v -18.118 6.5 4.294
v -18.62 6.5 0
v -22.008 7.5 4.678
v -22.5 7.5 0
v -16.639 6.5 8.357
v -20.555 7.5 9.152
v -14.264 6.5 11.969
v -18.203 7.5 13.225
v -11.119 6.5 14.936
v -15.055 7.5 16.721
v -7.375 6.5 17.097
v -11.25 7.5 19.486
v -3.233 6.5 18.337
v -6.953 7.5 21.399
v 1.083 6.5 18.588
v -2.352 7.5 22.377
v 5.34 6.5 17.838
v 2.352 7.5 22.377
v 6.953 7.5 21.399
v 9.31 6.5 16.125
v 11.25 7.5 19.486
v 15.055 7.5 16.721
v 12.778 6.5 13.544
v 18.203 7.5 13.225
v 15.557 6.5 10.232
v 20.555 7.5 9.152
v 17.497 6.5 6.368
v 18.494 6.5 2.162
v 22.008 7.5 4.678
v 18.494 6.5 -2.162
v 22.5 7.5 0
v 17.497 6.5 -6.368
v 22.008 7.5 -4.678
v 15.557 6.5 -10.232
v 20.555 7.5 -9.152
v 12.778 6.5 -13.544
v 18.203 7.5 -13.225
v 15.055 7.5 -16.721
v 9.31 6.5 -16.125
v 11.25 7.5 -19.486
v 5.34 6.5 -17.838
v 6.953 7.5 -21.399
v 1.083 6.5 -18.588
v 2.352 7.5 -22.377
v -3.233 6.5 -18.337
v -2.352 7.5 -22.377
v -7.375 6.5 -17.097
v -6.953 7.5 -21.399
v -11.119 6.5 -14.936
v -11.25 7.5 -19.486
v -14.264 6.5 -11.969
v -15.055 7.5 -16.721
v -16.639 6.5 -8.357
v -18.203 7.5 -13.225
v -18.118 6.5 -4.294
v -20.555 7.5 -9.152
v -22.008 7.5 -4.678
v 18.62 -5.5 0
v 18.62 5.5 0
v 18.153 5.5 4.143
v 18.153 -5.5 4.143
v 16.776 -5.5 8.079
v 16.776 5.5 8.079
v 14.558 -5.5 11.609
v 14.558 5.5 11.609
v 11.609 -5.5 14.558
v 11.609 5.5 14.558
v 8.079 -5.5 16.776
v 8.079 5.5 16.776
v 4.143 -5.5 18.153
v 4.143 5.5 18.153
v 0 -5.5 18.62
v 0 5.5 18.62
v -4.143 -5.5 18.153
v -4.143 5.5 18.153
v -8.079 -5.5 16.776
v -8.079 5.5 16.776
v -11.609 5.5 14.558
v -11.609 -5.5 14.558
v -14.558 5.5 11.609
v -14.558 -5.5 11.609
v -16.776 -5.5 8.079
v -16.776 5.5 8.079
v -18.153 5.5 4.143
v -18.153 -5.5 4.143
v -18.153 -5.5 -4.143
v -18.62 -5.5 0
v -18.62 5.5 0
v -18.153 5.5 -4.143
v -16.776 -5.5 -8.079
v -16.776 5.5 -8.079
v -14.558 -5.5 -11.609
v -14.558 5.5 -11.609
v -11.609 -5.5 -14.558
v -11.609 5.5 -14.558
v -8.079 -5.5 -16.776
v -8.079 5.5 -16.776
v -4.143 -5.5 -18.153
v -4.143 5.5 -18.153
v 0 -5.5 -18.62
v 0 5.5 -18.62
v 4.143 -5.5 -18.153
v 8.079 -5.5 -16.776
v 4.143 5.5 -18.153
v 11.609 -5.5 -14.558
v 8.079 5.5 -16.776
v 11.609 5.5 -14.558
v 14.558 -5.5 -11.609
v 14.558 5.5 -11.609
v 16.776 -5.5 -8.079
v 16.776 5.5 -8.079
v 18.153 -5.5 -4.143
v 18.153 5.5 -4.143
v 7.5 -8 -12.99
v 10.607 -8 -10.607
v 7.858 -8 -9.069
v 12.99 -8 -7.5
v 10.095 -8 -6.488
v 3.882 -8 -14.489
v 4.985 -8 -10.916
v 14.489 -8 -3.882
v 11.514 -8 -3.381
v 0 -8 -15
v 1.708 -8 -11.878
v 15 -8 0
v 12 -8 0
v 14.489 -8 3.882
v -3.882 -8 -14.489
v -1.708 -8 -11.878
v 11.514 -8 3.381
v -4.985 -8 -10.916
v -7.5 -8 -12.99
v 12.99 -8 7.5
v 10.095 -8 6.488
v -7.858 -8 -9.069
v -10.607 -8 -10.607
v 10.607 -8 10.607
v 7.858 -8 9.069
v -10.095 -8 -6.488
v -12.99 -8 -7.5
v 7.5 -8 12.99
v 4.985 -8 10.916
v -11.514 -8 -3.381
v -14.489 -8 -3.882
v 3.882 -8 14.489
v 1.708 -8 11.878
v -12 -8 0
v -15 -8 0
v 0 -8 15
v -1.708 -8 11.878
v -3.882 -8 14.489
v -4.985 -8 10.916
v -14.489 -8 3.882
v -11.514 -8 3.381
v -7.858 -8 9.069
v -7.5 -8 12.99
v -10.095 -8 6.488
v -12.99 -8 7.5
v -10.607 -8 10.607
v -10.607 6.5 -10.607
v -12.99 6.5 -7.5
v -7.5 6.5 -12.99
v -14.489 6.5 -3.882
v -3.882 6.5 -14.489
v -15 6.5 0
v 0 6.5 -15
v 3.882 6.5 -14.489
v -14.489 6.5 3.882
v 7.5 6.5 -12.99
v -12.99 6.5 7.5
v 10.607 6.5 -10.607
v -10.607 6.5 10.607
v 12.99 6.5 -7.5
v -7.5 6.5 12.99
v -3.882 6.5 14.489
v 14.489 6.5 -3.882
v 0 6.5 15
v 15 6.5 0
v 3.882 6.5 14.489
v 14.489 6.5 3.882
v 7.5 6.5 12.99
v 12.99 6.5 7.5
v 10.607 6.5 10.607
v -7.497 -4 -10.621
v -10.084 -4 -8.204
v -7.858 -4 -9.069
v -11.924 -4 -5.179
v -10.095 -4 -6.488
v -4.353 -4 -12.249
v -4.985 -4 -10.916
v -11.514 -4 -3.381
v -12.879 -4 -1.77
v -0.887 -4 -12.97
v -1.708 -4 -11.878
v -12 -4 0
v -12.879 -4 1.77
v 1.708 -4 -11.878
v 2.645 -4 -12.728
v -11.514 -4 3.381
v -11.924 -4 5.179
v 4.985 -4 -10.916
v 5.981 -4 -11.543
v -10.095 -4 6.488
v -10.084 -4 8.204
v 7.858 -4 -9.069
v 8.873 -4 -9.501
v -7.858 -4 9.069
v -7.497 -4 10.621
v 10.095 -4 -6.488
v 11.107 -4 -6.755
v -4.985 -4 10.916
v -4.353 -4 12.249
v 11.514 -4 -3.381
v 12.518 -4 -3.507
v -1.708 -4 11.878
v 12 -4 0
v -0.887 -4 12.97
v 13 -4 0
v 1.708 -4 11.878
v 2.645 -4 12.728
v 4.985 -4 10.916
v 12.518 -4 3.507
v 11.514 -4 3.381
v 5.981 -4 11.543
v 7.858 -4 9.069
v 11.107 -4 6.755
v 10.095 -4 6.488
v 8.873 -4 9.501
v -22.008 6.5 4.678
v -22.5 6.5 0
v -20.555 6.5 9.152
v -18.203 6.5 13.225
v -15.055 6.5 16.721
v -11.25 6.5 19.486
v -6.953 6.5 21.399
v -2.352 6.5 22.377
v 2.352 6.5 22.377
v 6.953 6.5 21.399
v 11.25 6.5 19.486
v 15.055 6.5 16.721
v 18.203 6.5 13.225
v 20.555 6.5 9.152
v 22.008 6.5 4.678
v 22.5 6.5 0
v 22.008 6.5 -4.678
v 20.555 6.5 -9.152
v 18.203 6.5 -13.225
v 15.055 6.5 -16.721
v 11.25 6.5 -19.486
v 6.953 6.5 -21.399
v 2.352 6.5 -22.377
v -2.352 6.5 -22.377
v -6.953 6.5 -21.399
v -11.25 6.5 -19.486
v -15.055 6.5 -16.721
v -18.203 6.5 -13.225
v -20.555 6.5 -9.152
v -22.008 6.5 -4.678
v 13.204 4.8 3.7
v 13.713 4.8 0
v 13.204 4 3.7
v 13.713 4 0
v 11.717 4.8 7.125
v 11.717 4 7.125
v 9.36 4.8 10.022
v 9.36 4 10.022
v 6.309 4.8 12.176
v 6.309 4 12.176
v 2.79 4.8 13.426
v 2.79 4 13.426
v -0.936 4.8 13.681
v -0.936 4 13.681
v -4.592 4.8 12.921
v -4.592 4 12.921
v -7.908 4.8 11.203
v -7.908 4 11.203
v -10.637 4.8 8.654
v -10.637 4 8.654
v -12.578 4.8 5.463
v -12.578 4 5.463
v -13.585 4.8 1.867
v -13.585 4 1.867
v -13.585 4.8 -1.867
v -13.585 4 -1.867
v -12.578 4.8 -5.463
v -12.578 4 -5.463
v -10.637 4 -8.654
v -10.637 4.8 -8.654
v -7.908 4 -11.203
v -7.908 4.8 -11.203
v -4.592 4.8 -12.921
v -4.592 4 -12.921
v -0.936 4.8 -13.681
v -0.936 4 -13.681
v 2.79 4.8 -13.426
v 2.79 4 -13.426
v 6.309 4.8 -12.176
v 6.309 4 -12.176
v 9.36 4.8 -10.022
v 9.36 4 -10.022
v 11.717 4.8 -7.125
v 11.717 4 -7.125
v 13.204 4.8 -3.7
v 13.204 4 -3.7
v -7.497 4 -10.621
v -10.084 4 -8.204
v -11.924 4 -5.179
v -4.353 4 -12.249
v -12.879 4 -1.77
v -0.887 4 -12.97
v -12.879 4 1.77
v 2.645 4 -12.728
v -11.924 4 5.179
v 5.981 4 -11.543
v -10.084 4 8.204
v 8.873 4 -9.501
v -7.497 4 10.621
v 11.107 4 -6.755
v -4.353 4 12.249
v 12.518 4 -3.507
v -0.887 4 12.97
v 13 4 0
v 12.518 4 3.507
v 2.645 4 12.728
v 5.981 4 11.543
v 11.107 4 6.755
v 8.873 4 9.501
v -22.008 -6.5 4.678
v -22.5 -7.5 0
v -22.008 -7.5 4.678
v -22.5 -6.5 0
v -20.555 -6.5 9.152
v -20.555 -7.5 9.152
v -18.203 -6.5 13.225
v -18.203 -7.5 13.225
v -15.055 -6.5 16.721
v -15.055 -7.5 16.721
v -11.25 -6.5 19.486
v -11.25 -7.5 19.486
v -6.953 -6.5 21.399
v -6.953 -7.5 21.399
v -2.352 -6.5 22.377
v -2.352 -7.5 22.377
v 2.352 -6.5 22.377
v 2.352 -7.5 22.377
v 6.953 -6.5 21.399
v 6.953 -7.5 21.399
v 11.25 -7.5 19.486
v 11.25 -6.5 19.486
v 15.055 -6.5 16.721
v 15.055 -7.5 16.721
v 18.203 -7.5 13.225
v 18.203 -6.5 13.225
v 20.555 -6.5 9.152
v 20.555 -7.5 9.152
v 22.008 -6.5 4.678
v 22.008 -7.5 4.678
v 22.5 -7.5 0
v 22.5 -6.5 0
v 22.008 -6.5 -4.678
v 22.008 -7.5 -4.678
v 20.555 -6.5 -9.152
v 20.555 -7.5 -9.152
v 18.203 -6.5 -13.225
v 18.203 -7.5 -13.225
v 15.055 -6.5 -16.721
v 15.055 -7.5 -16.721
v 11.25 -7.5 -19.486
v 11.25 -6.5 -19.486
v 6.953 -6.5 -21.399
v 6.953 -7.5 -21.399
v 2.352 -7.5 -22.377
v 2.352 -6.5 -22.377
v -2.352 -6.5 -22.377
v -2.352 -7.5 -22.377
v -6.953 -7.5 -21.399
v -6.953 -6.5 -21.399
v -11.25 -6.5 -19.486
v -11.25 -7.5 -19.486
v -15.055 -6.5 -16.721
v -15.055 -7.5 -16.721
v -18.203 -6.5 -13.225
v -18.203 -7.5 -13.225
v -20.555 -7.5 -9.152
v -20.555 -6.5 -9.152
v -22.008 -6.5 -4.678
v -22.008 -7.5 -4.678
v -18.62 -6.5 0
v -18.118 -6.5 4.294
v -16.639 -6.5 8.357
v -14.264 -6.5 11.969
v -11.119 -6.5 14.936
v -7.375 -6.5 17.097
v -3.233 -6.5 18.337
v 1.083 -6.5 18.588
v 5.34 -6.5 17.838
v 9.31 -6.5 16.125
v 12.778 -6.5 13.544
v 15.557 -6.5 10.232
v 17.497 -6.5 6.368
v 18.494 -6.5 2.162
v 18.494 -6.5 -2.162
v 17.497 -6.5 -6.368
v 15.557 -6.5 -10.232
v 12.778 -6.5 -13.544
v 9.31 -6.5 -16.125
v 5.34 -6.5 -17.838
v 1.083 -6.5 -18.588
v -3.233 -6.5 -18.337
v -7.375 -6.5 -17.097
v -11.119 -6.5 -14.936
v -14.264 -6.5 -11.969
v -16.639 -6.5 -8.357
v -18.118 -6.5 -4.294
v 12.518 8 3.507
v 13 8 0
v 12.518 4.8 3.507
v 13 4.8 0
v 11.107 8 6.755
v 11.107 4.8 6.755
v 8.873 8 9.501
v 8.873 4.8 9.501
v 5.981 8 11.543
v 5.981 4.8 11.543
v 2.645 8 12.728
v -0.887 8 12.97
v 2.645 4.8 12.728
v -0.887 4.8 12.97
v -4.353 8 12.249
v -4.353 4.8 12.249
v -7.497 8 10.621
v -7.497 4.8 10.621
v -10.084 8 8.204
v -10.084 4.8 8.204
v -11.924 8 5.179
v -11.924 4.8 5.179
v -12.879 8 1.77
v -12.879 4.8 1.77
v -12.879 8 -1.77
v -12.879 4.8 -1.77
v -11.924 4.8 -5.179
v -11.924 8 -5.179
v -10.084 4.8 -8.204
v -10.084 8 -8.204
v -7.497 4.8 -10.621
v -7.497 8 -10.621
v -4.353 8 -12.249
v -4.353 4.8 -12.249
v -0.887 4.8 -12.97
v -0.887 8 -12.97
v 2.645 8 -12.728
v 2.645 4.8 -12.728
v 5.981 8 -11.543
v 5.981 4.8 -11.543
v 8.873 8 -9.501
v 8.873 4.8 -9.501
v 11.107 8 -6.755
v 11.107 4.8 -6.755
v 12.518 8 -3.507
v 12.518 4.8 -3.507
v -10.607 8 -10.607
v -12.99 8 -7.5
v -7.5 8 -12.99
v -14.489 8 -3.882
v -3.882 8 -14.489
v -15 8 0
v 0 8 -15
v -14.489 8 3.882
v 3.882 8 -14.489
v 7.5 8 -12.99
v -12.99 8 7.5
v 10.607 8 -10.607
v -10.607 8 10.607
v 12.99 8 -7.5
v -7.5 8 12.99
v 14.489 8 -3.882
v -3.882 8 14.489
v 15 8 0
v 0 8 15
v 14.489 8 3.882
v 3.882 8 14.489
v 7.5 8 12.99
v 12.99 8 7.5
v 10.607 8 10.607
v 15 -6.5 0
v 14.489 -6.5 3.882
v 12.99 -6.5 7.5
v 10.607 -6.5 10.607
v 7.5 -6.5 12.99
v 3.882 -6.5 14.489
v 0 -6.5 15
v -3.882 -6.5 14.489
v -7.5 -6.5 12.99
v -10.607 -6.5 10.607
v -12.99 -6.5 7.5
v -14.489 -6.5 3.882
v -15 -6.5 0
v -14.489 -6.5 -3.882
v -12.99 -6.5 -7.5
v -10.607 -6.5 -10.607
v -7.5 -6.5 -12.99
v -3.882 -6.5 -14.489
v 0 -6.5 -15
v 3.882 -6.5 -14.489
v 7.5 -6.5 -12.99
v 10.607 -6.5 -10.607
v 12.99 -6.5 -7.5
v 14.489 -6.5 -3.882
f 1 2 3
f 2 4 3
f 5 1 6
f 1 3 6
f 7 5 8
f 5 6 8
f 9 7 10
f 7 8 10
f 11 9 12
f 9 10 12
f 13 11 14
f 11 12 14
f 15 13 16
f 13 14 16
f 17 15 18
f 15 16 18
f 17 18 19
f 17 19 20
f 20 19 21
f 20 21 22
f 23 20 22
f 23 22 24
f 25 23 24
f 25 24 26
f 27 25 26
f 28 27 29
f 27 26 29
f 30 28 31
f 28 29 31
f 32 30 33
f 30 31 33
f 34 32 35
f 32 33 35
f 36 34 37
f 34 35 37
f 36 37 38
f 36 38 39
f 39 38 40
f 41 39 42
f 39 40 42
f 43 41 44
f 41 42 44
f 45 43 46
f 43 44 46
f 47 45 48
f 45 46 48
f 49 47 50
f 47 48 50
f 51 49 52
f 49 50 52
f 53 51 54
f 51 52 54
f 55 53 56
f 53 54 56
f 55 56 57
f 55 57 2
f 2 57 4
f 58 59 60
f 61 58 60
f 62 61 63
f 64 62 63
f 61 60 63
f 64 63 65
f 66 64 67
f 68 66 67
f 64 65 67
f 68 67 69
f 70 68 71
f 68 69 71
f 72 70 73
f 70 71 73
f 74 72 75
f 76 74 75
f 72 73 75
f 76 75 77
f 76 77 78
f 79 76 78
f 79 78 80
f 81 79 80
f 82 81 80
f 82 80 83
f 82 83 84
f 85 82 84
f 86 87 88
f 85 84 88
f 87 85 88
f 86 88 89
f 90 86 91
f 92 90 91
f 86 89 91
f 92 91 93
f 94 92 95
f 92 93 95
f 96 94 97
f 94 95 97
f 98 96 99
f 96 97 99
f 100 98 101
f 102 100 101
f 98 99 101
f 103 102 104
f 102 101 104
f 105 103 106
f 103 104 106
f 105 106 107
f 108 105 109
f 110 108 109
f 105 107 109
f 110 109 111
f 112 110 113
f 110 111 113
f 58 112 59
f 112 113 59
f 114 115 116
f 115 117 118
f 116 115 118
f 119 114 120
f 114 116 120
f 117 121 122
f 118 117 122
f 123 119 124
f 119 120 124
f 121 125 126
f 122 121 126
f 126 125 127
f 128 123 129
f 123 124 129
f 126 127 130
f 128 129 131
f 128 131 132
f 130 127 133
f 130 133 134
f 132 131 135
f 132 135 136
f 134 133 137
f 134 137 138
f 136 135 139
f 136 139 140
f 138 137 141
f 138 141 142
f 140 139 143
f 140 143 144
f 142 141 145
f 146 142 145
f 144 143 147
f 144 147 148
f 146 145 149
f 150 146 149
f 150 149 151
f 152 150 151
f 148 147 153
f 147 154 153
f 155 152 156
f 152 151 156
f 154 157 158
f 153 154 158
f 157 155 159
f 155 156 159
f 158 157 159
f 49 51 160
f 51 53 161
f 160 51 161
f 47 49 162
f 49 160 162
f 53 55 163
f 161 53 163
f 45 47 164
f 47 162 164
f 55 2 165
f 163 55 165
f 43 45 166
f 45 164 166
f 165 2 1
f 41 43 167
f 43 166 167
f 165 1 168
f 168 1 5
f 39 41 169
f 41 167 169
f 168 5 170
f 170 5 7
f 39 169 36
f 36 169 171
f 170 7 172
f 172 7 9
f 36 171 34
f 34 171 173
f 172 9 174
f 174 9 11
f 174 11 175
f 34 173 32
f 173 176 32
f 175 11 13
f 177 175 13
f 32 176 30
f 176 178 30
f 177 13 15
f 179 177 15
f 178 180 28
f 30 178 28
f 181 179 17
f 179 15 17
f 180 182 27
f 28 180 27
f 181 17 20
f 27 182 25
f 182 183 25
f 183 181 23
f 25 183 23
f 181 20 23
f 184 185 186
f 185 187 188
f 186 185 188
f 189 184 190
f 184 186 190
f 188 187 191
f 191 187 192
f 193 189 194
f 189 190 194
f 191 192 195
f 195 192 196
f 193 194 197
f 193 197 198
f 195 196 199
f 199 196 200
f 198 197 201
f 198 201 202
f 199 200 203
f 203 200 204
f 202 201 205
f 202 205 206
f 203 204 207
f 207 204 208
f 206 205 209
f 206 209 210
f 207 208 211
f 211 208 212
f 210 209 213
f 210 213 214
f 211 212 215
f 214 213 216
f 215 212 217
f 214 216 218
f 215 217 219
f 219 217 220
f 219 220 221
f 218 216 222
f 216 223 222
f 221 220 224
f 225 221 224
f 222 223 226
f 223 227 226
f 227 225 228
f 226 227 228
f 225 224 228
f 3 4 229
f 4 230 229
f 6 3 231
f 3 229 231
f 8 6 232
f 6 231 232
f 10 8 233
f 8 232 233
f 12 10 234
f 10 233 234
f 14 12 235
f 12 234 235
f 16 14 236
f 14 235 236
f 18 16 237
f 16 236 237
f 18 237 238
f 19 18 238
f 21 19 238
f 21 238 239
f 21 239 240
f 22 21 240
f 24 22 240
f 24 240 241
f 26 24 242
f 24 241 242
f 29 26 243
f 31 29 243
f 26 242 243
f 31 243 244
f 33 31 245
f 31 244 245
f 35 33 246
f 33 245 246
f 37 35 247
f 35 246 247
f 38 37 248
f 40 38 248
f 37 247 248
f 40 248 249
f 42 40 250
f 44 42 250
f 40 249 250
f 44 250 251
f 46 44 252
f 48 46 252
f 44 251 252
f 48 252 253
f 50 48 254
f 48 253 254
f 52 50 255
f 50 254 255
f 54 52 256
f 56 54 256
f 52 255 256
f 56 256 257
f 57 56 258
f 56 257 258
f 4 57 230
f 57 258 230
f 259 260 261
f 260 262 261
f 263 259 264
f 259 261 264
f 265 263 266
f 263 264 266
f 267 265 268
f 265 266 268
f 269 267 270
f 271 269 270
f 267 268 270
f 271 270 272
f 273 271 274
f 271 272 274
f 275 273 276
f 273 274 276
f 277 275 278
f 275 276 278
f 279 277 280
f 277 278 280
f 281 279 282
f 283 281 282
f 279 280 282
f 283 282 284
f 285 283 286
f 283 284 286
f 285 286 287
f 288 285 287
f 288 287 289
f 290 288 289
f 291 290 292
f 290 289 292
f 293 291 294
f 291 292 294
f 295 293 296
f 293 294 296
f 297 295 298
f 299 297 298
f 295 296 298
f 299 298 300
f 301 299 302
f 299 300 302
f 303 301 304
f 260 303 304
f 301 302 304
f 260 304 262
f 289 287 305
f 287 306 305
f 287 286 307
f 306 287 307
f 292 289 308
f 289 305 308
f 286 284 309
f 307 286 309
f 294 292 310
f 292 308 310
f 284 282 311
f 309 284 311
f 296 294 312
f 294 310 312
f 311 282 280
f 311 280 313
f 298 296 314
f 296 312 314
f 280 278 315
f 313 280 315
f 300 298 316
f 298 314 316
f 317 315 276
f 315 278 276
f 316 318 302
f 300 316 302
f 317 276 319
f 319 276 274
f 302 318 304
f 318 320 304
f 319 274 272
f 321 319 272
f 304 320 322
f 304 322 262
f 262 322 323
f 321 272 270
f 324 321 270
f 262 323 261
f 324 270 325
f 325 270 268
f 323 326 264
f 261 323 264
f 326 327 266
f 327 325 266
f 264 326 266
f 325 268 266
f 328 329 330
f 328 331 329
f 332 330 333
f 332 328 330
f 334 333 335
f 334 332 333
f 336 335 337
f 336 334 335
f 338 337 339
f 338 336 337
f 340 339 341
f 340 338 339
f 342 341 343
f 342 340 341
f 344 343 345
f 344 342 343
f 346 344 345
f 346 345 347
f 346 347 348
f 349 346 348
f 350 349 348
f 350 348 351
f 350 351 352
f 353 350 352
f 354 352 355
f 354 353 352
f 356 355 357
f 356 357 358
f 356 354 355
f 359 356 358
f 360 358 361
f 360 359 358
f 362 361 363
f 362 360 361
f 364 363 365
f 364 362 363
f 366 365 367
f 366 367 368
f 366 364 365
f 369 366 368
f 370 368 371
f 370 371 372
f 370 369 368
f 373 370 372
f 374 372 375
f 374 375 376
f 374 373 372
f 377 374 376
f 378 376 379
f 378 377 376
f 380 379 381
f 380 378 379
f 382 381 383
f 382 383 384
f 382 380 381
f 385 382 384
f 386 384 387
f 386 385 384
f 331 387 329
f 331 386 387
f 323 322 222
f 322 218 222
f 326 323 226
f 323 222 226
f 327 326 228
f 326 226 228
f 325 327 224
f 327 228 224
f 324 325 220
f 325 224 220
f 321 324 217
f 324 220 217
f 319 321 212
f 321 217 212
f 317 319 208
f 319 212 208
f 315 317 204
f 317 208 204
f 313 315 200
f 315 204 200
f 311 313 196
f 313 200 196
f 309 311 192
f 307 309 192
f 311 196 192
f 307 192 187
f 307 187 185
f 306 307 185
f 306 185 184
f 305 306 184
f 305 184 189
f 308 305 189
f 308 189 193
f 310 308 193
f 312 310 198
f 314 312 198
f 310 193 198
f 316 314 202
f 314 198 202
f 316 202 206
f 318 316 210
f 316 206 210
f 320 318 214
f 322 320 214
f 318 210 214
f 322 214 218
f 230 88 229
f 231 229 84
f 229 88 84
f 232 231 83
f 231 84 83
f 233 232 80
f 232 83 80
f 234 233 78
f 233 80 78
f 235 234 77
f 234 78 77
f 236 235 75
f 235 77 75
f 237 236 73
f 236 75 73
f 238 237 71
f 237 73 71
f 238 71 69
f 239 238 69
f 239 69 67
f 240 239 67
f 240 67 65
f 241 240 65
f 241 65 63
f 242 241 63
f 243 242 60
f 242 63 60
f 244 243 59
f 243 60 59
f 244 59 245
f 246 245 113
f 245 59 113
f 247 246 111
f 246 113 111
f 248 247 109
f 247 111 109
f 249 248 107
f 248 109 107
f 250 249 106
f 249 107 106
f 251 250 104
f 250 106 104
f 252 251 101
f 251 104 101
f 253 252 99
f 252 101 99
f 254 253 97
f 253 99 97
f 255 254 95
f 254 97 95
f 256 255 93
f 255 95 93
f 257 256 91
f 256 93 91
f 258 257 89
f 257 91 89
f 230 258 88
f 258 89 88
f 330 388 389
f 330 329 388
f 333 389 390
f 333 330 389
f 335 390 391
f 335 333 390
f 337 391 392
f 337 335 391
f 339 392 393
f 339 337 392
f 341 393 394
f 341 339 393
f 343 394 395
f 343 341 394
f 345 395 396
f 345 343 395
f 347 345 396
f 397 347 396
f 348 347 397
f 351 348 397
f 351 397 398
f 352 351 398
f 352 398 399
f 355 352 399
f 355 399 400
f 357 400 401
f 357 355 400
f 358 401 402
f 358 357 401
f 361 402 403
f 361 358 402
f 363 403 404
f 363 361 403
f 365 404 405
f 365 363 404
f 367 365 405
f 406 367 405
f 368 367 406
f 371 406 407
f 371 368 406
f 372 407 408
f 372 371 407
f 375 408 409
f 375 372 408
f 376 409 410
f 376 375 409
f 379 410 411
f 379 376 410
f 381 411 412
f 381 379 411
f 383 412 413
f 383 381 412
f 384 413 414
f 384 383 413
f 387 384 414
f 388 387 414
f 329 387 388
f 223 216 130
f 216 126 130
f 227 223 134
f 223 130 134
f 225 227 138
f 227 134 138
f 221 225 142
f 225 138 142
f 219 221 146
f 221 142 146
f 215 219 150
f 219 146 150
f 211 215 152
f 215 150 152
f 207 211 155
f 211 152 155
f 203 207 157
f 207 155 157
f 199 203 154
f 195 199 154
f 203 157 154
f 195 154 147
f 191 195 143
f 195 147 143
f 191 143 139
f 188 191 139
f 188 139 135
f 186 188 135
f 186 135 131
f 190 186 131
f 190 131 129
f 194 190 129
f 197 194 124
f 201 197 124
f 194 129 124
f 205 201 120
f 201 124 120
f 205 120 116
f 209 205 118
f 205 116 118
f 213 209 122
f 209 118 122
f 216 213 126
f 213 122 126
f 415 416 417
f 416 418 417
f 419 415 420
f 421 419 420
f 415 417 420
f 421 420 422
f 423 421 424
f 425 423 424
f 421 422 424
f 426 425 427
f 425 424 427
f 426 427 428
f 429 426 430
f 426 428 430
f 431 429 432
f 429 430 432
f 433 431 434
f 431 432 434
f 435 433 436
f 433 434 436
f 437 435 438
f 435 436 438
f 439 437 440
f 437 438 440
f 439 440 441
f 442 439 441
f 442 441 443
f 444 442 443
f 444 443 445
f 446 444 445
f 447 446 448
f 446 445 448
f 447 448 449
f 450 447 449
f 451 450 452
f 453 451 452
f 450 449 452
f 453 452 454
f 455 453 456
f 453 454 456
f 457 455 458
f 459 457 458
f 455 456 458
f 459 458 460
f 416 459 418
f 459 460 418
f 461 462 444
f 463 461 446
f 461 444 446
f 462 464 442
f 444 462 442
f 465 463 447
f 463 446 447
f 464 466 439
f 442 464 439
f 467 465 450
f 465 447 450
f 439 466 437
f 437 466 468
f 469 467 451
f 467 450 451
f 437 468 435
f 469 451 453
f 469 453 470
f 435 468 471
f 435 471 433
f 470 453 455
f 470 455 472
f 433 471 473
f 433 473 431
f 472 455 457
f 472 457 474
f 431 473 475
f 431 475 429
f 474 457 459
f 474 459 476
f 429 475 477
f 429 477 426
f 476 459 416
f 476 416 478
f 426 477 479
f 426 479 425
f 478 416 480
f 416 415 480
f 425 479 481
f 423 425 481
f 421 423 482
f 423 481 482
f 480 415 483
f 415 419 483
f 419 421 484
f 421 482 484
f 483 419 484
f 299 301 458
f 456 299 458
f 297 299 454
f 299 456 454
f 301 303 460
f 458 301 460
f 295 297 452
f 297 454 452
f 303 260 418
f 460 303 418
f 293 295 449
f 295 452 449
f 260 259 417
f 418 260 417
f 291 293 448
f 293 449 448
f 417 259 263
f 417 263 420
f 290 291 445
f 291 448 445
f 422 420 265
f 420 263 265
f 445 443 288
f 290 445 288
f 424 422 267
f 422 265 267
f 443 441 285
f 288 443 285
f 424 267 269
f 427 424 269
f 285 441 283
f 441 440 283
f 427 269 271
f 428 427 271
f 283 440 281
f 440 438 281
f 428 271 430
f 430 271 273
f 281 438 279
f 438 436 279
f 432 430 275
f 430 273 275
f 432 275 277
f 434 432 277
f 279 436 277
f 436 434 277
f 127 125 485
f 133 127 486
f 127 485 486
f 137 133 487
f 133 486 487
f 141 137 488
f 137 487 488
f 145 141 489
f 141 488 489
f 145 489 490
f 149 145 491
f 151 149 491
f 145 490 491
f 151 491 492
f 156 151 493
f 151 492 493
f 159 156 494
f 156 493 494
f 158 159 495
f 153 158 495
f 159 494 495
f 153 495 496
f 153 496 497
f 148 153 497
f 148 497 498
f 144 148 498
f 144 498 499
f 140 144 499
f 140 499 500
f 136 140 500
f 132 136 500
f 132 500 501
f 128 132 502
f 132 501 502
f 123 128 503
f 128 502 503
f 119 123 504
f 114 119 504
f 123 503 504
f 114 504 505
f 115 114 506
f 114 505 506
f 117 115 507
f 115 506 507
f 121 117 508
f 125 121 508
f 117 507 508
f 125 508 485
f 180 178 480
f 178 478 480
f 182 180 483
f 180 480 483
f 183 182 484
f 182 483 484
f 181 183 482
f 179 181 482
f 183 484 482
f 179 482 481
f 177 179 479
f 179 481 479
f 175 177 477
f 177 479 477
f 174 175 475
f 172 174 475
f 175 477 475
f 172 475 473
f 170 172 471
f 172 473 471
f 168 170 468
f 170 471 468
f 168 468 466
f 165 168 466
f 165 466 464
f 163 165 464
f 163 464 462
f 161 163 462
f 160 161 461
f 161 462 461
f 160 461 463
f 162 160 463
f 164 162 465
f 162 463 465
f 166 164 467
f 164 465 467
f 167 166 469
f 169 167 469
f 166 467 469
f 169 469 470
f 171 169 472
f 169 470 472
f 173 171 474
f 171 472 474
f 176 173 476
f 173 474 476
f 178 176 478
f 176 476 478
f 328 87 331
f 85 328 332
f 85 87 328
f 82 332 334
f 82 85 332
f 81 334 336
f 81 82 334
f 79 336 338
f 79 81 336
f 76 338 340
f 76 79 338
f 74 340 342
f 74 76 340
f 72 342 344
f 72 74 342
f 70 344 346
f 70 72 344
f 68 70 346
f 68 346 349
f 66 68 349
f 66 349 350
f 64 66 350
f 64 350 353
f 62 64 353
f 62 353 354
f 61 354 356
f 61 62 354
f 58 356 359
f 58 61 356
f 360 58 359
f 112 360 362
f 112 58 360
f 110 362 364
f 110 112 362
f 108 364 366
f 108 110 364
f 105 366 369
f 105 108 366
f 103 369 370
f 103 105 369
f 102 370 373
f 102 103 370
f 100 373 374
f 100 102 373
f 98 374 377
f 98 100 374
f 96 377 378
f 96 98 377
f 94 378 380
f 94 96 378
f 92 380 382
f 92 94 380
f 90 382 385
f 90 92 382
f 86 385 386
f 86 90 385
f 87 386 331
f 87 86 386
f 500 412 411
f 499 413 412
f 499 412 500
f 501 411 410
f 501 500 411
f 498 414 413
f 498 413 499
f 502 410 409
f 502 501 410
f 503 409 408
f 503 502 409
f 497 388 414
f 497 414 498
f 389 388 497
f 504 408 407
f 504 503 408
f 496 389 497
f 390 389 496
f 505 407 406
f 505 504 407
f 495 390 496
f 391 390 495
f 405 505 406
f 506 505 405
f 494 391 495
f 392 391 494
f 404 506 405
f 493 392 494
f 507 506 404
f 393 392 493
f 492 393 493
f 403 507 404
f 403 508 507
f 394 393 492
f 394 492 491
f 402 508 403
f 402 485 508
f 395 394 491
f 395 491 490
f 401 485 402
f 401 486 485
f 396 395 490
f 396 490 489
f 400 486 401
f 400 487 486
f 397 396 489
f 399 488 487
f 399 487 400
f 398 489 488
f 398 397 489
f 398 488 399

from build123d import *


with BuildPart() as part:
    # 草圖1 → 旋轉1 (revolve)
    with BuildSketch(Plane.XY):
        Polygon((13, 4), (13, -4), (12, -4), (12, -8), (15, -8), (15, -5.5), (18.62, -5.5), (18.62, 5.5), (15, 5.5), (15, 8), (13, 8), (13, 4.8), (13.712949133, 4.8), (13.712949133, 4), align=None)
    revolve(axis=Axis((0, 49.340027701, 0), (0, -1, 0)))

    # 草圖7 → 旋轉2 (revolve)
    with BuildSketch(Plane.XY):
        Polygon((-22.5, -6.5), (-18.62, -5.5), (-15, -5.5), (-15, -6.5), (-18.62, -6.5), (-22.5, -7.5), align=None)
    revolve_2 = revolve(axis=Axis((0, 0, 0), (0, 1, 0)))

    # 鏡射1: 旋轉2 across plane
    add(revolve_2.mirror(Plane.ZX))


solid = part.part
